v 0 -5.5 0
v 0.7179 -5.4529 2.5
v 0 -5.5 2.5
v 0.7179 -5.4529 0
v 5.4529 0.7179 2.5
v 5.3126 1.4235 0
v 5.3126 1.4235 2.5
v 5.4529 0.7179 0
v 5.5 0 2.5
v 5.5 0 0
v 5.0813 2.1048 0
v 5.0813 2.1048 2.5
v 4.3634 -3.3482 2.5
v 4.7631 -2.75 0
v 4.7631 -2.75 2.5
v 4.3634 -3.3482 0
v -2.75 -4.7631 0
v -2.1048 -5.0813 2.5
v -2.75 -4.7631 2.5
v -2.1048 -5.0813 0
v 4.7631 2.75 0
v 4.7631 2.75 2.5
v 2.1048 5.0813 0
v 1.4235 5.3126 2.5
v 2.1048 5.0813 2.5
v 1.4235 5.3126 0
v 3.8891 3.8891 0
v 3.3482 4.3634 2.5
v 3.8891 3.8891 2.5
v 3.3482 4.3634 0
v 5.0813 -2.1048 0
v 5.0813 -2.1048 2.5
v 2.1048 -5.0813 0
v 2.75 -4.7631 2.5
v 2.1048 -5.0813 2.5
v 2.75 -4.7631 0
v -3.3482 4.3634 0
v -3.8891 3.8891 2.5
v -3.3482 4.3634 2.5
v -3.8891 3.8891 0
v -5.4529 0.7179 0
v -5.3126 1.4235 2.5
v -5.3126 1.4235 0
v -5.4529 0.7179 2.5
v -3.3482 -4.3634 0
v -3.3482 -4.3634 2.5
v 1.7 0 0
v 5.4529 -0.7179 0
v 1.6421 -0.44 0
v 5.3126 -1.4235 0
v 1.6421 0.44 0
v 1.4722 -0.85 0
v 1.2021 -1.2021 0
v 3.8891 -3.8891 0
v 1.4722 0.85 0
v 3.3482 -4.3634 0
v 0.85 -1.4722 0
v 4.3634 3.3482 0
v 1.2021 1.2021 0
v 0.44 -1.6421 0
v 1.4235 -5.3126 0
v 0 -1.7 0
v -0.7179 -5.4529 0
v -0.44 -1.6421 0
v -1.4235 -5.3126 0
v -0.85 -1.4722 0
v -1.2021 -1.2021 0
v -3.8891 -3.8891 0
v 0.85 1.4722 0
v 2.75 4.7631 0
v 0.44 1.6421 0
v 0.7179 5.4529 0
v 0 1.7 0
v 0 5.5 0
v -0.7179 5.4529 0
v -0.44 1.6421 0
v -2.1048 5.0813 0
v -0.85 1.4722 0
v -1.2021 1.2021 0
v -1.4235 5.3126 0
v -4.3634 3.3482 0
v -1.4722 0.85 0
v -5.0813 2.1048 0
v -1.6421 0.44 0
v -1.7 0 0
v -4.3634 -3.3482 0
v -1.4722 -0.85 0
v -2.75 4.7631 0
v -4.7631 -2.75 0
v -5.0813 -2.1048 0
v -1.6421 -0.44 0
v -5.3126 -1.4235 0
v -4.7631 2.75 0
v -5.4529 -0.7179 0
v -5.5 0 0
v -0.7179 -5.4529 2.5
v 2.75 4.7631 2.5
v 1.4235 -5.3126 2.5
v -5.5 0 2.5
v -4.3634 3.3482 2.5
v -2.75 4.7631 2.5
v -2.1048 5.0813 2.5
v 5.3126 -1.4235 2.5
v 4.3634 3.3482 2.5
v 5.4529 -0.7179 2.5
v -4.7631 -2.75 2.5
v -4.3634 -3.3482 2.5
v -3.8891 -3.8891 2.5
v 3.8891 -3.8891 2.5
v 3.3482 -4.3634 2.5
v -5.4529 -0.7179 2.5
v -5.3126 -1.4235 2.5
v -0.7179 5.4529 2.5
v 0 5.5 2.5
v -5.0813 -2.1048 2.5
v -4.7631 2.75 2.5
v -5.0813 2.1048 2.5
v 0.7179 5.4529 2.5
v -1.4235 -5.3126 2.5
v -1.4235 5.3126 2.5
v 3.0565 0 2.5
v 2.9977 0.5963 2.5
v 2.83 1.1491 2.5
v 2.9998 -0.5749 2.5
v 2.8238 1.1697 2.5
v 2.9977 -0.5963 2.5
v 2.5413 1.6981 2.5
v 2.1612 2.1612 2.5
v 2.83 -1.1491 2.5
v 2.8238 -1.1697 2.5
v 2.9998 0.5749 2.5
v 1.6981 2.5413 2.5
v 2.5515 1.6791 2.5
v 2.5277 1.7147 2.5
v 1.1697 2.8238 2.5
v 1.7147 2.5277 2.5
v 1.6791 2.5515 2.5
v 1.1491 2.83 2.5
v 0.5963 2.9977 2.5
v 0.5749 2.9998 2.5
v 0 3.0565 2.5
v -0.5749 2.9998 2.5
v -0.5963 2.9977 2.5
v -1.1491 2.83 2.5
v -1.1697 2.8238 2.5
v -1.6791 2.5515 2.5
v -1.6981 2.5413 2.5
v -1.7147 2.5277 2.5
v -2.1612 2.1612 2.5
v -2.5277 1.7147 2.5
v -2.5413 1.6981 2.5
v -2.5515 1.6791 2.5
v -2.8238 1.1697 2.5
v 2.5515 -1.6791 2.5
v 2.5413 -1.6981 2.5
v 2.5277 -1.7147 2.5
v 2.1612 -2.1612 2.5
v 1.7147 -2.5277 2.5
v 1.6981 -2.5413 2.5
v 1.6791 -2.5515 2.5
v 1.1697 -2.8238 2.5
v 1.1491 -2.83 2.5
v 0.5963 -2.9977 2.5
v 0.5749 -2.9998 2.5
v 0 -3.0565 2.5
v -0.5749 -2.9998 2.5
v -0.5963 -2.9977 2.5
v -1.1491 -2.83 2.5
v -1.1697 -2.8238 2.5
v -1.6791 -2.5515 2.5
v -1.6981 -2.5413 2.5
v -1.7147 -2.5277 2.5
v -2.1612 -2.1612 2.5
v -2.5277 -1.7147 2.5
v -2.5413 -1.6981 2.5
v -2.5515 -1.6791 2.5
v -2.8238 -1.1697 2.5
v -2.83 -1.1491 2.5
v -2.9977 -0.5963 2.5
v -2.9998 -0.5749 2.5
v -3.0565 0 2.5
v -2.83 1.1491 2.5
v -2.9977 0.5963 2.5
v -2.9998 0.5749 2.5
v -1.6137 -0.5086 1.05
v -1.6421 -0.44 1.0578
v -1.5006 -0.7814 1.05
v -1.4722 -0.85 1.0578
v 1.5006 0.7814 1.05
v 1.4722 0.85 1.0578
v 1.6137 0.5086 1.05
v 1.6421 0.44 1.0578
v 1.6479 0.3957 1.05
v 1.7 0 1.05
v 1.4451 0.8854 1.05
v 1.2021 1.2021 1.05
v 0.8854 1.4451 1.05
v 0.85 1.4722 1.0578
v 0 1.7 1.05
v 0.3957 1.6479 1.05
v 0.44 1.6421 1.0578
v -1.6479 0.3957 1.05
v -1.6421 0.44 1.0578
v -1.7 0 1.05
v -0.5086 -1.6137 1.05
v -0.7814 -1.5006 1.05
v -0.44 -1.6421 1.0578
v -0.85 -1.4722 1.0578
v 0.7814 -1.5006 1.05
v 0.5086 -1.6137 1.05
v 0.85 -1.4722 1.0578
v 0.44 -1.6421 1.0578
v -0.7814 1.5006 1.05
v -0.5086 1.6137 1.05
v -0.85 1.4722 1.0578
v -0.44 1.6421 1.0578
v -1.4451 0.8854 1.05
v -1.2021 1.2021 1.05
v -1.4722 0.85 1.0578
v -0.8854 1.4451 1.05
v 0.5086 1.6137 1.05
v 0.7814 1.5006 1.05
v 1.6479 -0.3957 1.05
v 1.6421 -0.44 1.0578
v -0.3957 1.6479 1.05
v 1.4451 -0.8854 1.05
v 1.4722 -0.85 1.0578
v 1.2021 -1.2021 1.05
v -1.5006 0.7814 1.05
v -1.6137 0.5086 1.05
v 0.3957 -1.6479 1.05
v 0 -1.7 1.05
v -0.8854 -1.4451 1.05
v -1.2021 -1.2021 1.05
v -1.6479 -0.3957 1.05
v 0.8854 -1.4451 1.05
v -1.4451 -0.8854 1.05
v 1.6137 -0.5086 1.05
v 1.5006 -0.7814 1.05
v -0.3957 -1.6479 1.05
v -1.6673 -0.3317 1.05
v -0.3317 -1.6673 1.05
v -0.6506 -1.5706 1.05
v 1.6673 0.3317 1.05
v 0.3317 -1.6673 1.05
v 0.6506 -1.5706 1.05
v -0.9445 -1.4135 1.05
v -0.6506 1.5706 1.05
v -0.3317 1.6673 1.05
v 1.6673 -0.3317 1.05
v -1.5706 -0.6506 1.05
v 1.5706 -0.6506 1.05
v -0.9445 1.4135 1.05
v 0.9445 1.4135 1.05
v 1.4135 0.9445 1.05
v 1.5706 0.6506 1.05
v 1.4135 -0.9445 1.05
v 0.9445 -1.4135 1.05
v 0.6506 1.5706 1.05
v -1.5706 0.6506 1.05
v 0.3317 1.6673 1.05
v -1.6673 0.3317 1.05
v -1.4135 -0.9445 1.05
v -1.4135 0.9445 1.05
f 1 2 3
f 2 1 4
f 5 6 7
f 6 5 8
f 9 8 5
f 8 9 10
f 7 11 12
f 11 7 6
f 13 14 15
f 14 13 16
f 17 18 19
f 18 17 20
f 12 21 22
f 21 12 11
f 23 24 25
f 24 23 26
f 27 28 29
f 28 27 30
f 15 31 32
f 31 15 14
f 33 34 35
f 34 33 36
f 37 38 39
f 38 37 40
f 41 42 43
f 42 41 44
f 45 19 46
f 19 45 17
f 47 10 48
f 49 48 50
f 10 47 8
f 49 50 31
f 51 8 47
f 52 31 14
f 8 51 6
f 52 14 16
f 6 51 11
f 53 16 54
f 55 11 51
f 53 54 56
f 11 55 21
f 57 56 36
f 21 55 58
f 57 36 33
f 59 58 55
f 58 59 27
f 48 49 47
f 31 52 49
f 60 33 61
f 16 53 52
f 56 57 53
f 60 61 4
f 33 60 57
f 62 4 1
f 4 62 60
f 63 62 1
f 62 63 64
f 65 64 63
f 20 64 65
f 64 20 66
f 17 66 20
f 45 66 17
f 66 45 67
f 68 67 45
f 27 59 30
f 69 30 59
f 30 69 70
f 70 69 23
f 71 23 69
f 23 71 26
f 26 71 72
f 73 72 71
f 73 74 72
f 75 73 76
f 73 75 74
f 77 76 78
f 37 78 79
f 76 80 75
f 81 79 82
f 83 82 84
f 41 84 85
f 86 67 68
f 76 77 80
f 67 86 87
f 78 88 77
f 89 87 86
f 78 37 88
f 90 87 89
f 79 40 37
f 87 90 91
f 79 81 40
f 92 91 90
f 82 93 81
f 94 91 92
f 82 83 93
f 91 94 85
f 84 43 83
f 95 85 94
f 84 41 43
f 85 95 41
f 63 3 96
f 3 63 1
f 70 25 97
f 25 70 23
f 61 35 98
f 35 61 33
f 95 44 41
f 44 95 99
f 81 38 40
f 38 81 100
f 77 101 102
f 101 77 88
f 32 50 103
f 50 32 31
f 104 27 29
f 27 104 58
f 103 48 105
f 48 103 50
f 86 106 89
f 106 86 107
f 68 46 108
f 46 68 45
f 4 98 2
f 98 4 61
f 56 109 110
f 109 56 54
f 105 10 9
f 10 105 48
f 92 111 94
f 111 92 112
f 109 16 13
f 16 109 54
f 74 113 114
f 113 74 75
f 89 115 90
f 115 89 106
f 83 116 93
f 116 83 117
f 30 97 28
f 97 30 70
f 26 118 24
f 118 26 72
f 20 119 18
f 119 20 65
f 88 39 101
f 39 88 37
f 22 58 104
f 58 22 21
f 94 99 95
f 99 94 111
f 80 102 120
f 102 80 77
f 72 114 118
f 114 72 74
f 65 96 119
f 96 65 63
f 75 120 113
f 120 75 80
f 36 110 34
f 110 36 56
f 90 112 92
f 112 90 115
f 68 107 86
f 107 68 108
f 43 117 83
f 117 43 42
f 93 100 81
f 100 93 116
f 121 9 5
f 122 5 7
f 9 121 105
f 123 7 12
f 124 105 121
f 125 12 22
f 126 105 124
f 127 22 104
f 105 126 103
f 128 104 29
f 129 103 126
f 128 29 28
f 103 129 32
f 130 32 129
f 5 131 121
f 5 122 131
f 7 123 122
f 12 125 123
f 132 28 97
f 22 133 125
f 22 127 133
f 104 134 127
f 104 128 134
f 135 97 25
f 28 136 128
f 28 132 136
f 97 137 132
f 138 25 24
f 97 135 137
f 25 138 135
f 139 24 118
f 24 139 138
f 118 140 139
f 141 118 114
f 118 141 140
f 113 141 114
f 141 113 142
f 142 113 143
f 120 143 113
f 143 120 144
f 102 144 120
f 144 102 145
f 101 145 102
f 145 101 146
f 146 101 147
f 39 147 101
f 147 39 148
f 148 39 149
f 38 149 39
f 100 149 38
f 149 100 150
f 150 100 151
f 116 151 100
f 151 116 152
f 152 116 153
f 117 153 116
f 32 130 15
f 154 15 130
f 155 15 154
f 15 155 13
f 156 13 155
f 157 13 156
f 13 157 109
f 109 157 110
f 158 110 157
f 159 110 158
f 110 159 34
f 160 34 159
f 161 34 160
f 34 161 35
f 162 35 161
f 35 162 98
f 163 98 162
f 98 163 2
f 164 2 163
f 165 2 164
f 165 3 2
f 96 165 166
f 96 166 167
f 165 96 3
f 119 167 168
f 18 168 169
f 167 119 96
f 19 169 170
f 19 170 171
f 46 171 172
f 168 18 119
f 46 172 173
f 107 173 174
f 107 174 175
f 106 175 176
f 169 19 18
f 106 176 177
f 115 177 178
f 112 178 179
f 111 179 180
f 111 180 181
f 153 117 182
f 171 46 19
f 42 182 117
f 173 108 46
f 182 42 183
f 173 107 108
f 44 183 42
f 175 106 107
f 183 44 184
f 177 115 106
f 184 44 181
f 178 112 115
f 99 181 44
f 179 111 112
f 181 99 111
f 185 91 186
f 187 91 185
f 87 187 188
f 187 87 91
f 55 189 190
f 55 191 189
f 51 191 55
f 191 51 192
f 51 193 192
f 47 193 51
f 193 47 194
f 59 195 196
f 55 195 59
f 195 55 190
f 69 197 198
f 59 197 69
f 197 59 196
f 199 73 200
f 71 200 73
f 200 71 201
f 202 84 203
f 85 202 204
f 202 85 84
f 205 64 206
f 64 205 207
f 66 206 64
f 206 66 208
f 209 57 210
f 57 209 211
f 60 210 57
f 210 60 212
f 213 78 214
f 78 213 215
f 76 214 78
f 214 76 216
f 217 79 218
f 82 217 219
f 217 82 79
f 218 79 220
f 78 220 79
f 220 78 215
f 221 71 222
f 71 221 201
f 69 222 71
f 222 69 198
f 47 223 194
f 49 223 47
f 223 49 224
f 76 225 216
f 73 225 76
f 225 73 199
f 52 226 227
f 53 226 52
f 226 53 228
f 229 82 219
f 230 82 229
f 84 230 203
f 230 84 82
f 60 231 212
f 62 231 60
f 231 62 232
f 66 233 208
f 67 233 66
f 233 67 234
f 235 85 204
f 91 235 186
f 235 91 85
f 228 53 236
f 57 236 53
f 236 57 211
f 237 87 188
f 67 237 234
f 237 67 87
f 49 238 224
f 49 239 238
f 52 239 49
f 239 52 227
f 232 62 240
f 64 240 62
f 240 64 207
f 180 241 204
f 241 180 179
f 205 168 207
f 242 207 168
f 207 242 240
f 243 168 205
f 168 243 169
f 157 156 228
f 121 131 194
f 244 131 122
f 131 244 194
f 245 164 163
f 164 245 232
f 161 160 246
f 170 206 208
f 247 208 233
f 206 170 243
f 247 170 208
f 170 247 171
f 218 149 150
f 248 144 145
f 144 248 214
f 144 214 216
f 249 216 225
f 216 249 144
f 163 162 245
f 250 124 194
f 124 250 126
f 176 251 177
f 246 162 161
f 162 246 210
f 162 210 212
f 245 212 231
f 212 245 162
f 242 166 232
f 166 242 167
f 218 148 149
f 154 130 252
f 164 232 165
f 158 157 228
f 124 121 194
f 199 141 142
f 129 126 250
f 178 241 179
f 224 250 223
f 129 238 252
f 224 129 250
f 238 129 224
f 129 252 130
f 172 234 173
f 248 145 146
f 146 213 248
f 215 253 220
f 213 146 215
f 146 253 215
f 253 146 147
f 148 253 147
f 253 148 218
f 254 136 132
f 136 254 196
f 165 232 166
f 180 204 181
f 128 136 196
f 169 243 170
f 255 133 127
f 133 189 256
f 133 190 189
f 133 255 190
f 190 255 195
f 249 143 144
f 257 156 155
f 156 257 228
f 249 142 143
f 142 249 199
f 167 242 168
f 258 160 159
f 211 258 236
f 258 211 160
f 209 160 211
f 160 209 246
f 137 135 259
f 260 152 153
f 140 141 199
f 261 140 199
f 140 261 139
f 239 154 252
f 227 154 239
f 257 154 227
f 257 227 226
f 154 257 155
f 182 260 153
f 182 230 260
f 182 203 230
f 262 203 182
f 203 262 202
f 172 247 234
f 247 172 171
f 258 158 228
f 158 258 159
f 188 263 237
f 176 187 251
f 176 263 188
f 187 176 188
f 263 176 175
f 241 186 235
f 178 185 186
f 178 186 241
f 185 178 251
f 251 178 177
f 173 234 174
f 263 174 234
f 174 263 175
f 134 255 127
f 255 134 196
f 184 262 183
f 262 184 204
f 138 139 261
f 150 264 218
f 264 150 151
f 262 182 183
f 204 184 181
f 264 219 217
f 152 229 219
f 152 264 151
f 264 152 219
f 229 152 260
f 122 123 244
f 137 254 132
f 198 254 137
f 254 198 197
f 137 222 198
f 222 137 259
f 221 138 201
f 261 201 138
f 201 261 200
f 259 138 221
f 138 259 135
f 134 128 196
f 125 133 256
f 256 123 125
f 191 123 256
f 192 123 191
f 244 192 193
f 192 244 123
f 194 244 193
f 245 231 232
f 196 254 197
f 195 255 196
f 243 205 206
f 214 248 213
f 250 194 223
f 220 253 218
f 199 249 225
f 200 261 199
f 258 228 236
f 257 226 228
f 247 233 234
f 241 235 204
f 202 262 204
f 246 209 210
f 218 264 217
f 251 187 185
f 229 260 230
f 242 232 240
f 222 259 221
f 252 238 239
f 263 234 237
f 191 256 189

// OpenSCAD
// Print-ready export: key-turner shaft washer (plain PETG) (v2, 5:1; see key_turner_housing.scad)
use <key_turner_housing.scad>
print_washer();
